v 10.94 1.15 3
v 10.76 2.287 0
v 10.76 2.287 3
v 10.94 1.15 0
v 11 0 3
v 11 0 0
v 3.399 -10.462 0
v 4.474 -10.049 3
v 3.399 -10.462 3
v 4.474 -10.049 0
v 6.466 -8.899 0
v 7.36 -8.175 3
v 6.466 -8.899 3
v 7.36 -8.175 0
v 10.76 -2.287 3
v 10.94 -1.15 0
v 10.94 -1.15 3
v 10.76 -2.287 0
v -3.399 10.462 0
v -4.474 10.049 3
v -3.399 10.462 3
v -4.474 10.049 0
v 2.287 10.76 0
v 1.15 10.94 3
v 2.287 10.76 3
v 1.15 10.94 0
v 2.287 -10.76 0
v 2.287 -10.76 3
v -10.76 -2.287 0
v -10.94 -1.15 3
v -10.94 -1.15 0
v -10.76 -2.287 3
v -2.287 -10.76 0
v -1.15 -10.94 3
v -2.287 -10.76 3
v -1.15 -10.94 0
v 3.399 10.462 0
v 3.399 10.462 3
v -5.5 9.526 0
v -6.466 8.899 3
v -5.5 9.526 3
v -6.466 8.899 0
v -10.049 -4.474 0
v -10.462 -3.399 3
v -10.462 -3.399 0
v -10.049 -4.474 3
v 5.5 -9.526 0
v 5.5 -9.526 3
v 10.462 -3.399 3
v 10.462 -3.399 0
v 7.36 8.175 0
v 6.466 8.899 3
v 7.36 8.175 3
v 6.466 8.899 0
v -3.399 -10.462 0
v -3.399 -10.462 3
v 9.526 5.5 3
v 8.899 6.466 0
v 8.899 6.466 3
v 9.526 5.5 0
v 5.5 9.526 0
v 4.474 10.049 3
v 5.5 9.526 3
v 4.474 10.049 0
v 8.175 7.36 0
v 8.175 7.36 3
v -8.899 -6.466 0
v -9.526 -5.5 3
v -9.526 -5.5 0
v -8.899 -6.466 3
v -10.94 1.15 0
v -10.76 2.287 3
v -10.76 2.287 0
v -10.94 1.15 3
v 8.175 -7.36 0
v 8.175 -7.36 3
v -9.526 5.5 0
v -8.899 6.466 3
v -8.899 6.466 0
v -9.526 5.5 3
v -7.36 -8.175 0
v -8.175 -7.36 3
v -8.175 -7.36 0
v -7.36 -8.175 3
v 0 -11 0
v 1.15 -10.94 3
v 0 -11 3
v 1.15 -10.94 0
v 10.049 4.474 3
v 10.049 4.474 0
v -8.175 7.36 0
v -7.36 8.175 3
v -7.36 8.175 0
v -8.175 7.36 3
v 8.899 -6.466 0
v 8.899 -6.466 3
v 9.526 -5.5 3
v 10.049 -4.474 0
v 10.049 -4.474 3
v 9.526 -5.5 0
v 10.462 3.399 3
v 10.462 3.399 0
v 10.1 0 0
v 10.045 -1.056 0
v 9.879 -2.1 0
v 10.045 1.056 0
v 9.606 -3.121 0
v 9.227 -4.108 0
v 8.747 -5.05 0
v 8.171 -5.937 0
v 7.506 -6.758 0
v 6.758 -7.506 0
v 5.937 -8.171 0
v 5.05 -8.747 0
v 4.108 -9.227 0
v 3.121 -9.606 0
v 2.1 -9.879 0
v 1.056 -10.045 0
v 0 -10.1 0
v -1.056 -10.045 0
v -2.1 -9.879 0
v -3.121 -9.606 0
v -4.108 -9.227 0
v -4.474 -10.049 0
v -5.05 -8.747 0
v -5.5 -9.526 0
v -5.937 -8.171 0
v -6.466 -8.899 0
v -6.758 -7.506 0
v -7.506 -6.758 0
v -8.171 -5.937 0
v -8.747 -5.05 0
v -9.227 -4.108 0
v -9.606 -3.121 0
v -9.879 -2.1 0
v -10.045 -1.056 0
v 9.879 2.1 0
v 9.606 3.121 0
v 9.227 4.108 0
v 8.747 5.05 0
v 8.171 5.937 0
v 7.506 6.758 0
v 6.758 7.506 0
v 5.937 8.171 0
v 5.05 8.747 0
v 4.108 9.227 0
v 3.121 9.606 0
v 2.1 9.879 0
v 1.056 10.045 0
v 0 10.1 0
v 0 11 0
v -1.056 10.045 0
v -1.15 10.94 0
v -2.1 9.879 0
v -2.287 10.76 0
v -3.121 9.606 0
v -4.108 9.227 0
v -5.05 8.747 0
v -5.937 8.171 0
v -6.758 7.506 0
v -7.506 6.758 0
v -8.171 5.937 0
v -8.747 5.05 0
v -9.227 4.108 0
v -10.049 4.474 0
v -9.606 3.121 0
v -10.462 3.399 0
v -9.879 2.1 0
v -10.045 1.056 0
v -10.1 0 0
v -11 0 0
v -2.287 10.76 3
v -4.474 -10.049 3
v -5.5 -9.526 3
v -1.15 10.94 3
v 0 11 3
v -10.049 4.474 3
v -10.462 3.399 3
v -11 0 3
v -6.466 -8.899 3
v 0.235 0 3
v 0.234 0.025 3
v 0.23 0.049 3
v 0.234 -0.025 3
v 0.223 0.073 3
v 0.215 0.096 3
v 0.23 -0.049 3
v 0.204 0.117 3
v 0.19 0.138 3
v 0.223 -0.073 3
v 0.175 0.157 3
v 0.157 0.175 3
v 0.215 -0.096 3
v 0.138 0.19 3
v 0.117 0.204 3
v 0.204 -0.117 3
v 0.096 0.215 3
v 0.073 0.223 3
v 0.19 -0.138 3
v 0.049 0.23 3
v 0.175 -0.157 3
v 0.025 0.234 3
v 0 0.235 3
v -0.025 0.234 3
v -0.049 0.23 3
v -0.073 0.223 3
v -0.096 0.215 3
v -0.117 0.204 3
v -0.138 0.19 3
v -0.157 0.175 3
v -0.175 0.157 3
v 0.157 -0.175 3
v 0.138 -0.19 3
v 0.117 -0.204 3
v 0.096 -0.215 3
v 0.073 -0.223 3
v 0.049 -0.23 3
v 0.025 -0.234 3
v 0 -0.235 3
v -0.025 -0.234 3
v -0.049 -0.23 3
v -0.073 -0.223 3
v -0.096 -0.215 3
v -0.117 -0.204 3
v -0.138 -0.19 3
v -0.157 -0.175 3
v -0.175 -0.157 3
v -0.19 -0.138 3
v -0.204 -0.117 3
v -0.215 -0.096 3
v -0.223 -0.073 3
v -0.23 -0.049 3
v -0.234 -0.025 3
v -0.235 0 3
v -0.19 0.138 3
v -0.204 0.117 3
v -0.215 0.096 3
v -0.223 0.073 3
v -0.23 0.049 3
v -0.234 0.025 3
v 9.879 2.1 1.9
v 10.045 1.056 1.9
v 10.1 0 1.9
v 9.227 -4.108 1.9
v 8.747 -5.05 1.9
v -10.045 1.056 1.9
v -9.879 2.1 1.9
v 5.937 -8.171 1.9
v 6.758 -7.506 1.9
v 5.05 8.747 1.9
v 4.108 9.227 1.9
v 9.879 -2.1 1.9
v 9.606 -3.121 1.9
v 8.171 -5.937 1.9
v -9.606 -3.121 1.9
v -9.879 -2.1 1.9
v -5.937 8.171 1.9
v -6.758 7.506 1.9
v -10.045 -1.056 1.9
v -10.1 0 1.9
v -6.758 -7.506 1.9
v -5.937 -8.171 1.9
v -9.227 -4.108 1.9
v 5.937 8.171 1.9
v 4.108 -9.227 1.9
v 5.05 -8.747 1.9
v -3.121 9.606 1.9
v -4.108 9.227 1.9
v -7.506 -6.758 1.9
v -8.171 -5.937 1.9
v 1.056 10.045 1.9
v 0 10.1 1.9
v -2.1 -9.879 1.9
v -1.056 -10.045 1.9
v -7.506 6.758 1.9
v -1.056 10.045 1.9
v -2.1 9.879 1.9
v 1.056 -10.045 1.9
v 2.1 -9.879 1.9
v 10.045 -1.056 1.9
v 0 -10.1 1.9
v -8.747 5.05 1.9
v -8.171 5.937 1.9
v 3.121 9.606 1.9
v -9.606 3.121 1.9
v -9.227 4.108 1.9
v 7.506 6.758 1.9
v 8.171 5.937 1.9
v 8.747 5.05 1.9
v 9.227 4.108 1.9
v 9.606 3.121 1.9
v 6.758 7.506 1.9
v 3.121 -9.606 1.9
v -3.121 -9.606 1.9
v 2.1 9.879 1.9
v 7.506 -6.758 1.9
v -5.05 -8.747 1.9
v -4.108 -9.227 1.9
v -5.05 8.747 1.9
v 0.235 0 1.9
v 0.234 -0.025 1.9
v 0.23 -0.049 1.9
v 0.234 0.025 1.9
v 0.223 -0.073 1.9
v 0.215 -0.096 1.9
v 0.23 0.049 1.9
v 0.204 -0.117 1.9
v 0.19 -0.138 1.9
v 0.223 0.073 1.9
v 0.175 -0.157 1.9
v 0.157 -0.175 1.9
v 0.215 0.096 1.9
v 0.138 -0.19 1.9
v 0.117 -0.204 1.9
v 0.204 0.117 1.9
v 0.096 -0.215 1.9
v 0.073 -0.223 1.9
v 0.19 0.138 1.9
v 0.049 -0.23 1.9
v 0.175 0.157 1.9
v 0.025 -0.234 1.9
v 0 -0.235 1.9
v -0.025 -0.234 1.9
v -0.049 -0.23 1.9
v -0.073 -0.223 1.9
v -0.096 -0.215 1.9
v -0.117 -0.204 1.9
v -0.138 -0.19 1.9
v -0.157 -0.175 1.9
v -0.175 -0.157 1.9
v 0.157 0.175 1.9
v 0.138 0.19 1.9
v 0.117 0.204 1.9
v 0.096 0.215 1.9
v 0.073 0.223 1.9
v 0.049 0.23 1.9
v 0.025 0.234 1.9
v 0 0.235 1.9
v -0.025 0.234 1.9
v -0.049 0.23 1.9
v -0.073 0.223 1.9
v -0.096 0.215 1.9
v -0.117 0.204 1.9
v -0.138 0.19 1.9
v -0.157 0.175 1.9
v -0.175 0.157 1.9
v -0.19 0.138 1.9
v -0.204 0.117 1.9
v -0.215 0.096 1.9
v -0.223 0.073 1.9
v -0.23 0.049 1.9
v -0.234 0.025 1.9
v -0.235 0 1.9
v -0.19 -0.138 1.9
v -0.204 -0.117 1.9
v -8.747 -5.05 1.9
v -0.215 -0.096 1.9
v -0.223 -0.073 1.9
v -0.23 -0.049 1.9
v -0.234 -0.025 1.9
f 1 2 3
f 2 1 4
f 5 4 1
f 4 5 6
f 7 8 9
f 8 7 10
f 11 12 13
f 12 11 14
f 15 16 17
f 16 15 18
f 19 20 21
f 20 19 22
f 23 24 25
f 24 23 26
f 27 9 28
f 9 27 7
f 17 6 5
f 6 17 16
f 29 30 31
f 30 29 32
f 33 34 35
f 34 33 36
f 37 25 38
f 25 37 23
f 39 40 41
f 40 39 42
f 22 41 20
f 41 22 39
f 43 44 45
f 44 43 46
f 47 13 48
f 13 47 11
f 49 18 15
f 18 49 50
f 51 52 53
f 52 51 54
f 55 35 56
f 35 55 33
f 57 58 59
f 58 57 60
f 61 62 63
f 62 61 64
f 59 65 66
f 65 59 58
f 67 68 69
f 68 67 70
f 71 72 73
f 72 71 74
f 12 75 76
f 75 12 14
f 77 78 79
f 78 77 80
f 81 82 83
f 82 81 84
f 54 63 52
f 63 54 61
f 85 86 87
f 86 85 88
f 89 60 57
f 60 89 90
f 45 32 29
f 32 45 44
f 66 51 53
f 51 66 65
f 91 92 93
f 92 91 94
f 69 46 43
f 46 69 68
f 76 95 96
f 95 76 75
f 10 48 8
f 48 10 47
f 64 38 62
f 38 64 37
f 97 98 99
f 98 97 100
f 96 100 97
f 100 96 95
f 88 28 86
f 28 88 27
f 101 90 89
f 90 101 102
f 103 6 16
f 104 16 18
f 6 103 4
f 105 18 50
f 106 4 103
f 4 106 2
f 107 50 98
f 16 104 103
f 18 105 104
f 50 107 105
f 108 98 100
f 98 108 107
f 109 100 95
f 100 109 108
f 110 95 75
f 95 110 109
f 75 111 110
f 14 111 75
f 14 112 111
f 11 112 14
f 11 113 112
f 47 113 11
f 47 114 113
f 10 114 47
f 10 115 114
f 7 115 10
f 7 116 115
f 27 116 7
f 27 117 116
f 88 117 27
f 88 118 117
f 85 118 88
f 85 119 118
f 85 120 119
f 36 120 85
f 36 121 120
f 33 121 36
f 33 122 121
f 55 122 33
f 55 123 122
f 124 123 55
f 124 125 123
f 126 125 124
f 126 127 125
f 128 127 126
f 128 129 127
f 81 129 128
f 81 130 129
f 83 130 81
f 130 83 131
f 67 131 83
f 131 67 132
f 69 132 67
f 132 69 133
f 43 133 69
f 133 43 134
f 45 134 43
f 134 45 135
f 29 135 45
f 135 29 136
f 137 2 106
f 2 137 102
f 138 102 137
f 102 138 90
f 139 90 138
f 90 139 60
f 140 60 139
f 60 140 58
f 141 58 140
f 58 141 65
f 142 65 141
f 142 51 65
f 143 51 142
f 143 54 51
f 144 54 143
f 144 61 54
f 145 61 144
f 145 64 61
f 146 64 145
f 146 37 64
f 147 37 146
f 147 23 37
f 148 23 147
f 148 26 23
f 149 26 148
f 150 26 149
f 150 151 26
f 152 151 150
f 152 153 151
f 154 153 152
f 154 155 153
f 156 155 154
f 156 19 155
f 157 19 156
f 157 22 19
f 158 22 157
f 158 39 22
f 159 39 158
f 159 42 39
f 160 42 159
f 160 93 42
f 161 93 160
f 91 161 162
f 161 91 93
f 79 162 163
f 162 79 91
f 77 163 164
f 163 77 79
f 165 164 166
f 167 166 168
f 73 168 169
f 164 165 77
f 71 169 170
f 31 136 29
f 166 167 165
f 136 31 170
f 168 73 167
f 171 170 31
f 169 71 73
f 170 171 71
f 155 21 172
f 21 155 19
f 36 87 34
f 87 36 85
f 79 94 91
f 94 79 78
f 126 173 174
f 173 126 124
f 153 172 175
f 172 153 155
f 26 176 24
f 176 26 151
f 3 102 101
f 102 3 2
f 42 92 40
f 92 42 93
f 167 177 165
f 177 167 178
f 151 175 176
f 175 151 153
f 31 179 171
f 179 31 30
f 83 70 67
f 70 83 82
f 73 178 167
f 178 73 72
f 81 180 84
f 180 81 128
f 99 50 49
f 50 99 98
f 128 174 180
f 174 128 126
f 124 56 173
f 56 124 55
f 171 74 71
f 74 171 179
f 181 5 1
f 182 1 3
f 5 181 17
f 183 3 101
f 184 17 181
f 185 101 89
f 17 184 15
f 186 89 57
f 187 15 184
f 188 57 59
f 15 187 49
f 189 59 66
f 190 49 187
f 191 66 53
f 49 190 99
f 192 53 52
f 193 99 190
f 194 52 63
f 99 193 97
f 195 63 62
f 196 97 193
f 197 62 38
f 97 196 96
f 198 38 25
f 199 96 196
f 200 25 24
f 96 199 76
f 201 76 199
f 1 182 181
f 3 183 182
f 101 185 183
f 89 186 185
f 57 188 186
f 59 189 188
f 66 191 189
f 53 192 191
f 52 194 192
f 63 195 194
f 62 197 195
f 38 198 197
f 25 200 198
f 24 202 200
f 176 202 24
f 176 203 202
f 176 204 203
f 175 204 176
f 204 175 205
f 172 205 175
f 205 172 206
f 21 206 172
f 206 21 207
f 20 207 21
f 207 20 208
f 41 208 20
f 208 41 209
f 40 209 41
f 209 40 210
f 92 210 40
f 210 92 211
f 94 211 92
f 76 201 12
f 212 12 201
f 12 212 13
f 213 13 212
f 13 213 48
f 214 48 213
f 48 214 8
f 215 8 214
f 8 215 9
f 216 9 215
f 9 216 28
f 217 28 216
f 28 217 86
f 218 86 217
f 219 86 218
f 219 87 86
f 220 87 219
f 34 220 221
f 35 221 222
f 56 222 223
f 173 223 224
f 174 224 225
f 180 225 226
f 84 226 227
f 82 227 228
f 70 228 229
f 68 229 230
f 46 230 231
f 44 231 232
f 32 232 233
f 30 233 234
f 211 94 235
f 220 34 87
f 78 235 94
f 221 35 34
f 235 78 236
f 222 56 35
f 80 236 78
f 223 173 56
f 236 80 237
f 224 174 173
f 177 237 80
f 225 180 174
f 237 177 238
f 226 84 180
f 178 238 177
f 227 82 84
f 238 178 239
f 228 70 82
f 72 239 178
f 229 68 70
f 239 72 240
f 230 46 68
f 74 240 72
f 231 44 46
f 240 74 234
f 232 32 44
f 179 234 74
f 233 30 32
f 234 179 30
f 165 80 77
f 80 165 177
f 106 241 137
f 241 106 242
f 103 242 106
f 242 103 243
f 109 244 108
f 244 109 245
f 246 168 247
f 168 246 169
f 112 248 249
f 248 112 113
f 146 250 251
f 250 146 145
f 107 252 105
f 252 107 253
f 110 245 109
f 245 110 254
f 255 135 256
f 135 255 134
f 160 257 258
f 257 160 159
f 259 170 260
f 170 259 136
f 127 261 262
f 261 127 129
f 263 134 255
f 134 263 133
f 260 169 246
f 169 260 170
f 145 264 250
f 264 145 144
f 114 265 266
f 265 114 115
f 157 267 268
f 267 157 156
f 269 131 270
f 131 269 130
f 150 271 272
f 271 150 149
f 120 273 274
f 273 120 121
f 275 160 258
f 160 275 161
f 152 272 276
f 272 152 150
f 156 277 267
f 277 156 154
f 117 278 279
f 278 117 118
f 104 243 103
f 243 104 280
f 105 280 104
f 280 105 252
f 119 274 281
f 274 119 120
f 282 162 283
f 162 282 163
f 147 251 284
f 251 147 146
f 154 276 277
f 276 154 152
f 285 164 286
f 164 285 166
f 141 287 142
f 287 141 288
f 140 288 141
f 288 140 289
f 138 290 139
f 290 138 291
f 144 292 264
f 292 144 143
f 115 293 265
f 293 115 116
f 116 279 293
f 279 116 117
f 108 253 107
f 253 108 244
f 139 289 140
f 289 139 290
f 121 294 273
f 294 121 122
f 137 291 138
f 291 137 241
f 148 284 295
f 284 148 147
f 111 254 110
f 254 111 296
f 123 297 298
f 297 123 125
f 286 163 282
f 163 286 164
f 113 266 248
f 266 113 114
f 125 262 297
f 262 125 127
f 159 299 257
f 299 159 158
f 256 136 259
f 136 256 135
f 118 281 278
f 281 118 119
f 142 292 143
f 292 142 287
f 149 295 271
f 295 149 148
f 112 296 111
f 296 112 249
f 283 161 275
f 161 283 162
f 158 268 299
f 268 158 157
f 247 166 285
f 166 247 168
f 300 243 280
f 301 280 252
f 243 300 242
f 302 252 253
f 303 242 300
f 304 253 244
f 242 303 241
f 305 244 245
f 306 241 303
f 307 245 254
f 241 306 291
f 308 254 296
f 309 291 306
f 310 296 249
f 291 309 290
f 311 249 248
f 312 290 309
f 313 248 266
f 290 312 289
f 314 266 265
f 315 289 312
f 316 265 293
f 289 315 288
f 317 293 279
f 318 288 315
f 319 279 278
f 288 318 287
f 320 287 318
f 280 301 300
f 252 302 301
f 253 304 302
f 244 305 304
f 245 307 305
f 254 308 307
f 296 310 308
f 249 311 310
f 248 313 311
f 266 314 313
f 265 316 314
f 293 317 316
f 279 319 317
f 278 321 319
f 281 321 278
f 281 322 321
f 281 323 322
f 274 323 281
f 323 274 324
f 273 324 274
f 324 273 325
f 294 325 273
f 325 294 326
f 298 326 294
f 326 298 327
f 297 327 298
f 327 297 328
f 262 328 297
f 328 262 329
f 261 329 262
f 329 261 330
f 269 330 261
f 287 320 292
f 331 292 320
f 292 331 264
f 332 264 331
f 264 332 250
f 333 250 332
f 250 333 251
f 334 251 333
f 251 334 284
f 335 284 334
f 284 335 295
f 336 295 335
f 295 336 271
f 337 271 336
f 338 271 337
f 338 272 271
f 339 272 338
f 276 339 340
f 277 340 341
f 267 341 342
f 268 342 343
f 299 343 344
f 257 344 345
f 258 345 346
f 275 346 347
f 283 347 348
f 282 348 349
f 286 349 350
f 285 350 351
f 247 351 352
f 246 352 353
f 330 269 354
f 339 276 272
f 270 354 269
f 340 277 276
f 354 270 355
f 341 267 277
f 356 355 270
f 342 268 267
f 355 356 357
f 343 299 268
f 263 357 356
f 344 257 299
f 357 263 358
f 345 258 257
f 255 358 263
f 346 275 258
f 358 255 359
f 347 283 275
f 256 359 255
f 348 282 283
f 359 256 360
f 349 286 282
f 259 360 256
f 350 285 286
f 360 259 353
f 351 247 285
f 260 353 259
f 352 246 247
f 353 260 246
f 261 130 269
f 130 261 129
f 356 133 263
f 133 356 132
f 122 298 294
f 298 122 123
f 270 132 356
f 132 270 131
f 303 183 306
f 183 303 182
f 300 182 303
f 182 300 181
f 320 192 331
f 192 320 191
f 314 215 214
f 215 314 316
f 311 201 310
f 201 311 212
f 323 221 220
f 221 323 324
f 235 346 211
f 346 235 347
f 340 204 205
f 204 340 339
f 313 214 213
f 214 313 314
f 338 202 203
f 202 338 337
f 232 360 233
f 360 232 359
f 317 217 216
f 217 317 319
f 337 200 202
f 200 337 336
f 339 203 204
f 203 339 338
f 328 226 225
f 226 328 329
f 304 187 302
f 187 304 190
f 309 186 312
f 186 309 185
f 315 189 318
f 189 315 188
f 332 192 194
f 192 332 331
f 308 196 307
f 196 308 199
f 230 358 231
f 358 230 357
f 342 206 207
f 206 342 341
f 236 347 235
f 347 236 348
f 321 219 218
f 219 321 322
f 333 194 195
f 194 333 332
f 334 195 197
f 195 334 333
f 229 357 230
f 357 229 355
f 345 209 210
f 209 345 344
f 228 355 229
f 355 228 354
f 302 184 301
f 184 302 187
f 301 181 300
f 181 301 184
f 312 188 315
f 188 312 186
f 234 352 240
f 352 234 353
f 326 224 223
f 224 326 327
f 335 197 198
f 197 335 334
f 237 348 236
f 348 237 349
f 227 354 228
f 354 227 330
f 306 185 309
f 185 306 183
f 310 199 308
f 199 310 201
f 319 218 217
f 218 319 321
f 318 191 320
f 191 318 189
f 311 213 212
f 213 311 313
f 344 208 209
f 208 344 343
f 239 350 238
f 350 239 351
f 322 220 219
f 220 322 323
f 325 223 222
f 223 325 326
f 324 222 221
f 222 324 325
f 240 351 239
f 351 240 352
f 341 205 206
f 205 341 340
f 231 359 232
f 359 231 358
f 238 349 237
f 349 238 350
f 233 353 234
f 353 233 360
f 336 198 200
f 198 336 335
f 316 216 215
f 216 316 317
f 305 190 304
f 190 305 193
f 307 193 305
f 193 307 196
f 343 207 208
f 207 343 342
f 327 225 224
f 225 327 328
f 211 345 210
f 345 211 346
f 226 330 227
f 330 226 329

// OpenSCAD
$fn = 60;
difference() {
  cylinder(r=11, h=3);
  translate([0,0,-0.1]) cylinder(r=10.1, h=3-1);
  cylinder(r=0.47/2, h=5);
}
